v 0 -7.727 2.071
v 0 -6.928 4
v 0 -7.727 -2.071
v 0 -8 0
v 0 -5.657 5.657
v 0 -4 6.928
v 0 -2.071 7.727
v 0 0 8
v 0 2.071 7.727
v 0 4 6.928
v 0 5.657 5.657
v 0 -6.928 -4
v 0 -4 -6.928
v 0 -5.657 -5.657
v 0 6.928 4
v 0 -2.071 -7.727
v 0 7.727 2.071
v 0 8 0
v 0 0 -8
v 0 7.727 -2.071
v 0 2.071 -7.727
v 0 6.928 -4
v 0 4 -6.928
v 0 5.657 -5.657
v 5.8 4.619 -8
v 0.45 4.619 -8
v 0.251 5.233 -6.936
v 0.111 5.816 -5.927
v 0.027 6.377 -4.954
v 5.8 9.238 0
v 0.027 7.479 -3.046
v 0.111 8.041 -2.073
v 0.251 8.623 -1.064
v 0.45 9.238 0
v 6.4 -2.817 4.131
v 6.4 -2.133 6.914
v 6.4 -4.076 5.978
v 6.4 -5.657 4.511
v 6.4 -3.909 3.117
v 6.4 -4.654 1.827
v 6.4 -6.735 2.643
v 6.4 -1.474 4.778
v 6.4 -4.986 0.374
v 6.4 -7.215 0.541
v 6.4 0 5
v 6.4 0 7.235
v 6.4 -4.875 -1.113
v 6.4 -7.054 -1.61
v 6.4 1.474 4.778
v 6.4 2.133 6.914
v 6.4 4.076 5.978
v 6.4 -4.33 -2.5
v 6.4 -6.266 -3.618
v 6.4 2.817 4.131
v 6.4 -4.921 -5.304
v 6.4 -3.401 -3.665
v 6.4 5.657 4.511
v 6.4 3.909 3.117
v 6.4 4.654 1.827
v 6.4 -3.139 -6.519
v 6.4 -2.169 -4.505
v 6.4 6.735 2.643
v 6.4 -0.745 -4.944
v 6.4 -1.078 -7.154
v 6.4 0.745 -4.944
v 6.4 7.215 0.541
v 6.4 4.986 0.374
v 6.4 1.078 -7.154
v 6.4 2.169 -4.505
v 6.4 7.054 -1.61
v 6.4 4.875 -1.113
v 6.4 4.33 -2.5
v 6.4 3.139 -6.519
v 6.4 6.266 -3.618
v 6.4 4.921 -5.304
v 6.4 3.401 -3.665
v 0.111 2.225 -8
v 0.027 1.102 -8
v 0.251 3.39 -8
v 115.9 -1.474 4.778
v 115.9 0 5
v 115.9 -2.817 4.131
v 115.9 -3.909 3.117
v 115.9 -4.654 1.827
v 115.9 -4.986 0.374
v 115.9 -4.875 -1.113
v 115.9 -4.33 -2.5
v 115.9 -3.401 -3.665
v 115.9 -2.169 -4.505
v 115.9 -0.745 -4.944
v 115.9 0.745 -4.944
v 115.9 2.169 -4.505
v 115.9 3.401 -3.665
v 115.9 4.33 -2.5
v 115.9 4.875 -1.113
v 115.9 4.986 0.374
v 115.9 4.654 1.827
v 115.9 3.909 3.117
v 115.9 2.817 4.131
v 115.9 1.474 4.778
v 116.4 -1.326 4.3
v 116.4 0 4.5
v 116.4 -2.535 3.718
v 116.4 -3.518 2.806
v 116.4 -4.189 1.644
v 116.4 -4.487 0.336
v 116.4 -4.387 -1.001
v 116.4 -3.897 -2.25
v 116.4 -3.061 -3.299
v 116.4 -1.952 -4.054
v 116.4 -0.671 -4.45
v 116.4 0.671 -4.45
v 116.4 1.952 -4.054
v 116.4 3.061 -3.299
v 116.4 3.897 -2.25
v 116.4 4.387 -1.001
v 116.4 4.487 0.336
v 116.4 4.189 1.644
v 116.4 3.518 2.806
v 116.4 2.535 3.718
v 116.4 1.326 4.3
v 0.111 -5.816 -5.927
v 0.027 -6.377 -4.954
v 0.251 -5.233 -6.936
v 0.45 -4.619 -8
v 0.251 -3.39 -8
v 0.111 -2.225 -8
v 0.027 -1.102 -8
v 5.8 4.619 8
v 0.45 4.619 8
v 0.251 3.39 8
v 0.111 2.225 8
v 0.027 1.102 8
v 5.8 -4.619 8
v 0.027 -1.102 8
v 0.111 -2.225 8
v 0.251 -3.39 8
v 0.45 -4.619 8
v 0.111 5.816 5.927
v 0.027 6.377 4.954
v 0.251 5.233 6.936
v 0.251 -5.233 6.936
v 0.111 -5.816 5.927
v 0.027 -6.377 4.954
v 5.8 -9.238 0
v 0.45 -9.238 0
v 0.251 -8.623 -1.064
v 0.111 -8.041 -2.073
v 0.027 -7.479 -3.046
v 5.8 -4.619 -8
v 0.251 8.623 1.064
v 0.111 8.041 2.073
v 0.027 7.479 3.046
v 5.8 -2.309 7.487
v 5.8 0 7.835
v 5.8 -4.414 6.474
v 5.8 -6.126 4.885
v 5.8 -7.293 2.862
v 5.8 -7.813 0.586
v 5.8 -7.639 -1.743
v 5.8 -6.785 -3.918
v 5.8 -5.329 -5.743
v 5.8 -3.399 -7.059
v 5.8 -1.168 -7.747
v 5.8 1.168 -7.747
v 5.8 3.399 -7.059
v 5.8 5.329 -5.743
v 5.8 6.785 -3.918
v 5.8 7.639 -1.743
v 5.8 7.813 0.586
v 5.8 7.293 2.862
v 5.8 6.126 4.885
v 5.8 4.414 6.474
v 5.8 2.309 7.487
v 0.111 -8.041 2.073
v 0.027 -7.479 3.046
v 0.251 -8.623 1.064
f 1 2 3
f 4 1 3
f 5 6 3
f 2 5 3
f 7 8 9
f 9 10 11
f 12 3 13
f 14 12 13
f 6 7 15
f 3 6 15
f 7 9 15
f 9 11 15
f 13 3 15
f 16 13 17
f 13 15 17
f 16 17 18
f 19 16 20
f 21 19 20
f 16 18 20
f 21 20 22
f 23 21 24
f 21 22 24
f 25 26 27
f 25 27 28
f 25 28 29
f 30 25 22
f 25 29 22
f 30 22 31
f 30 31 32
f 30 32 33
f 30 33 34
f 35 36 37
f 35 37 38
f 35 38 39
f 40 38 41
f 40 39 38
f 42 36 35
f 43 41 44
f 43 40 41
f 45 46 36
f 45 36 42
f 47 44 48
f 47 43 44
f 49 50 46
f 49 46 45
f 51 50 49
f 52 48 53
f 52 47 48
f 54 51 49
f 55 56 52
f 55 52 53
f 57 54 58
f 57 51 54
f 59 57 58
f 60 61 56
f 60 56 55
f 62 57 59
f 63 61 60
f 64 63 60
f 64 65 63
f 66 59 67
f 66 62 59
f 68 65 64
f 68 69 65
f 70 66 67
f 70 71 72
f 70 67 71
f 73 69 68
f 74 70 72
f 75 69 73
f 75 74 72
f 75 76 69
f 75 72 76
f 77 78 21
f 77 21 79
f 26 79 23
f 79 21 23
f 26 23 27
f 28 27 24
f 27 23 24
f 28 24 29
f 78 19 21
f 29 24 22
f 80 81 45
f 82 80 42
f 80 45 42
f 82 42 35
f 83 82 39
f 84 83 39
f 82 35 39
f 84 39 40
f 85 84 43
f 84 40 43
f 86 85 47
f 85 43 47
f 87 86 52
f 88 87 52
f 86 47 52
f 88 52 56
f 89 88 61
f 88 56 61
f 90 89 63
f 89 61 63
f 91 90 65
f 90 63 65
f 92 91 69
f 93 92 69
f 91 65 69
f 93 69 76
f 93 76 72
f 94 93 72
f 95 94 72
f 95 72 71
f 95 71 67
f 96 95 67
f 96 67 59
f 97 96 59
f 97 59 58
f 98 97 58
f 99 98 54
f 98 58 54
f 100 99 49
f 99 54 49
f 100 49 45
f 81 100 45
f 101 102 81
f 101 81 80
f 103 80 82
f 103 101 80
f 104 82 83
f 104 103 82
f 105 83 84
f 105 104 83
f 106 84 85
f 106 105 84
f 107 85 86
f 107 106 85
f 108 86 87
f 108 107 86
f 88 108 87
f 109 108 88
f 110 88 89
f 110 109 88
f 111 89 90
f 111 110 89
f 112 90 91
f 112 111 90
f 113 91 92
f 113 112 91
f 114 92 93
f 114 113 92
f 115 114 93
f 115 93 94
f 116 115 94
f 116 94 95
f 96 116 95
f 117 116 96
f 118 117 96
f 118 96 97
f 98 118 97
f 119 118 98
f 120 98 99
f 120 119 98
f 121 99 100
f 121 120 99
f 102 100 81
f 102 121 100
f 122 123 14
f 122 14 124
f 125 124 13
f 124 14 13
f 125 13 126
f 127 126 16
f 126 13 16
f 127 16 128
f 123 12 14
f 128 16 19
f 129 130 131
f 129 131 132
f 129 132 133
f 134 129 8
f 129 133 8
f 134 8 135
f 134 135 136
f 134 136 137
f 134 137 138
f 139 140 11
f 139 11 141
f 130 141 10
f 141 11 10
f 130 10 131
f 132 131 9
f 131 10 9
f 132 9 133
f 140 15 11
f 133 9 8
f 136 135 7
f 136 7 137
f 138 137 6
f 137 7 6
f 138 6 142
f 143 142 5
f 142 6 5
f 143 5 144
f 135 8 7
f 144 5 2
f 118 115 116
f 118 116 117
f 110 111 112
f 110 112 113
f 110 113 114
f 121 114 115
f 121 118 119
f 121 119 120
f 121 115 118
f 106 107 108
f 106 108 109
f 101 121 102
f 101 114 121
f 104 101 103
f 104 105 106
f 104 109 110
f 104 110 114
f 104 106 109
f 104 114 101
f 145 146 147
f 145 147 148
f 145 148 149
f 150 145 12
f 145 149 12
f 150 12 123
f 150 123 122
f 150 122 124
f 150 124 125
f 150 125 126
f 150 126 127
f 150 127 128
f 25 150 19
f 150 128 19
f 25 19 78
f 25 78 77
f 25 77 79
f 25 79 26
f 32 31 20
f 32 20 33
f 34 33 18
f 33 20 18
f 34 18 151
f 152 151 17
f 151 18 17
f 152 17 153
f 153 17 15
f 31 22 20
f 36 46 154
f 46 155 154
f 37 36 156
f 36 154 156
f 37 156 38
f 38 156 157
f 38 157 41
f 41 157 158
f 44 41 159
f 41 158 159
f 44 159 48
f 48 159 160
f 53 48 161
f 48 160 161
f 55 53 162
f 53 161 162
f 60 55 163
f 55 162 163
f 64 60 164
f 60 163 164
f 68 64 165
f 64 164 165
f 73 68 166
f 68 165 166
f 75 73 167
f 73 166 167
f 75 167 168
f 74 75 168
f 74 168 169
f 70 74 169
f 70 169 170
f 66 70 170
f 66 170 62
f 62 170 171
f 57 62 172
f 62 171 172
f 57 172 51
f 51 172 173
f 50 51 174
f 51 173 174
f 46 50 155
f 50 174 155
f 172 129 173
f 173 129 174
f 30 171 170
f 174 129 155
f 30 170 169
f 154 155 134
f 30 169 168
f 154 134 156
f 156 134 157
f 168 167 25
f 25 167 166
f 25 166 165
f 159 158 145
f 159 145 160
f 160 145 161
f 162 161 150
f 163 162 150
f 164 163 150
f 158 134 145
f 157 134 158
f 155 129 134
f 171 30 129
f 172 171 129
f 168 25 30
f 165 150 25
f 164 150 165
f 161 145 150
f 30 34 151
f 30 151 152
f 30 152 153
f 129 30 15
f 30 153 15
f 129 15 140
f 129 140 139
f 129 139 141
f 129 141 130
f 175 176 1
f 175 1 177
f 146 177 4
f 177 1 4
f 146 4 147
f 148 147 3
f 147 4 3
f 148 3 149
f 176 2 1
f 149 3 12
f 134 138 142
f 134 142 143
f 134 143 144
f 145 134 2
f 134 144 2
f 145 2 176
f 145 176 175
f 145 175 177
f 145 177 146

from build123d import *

# Parameters (mm, degrees)
BASEHEAD_DEPTH = 6.4
SKETCH5_R      = 5
BASEBODY_DEPTH = 110
CHAMFER1_SIZE  = 0.5


with BuildPart() as part:
    # Sketch2 → BaseHead (new body)
    with BuildSketch(Plane(origin=(0, 0, 0), x_dir=(0, 0, -1), z_dir=(1, 0, 0))):
        Polygon((0, -9.237604307), (8, -4.618802154), (8, 4.618802154), (0, 9.237604307), (-8, 4.618802154), (-8, -4.618802154), align=None)
    extrude(amount=BASEHEAD_DEPTH)

    # Sketch3 → BearingFace (revolve, cut)
    with BuildSketch(Plane.XY, mode=Mode.PRIVATE) as bearingface_sk:
        Polygon((6.4, 9.237604307), (6.4, 7.235), (5.8, 7.835), (5.8, 9.237604307), align=None)
    revolve(bearingface_sk.sketch.rotate(Axis((-0.957090588, 0, 0), (1, 0, 0)), 90), axis=Axis((-0.957090588, 0, 0), (1, 0, 0)), mode=Mode.SUBTRACT)

    # Sketch4 → HeadChamfer (revolve, cut)
    with BuildSketch(Plane.XY):
        Polygon((0, 9.237604307), (0.45045113, 9.237604307), (0, 8), align=None)
    revolve(axis=Axis((-0.493528746, 0, 0), (1, 0, 0)), mode=Mode.SUBTRACT)

    # Sketch5 → BaseBody (add)
    with BuildSketch(Plane(origin=(6.4, 0, 0), x_dir=(0, 0, -1), z_dir=(1, 0, 0))):
        with Locations(Location((0, 0, 0), (0, 0, 180))):
            Circle(SKETCH5_R)
    extrude(amount=BASEBODY_DEPTH)

    # Chamfer1
    chamfer1_edges = [part.edges().sort_by_distance(p)[0] for p in [
        (116.4, 0, -5),
    ]]
    chamfer(chamfer1_edges, length=CHAMFER1_SIZE)


solid = part.part
